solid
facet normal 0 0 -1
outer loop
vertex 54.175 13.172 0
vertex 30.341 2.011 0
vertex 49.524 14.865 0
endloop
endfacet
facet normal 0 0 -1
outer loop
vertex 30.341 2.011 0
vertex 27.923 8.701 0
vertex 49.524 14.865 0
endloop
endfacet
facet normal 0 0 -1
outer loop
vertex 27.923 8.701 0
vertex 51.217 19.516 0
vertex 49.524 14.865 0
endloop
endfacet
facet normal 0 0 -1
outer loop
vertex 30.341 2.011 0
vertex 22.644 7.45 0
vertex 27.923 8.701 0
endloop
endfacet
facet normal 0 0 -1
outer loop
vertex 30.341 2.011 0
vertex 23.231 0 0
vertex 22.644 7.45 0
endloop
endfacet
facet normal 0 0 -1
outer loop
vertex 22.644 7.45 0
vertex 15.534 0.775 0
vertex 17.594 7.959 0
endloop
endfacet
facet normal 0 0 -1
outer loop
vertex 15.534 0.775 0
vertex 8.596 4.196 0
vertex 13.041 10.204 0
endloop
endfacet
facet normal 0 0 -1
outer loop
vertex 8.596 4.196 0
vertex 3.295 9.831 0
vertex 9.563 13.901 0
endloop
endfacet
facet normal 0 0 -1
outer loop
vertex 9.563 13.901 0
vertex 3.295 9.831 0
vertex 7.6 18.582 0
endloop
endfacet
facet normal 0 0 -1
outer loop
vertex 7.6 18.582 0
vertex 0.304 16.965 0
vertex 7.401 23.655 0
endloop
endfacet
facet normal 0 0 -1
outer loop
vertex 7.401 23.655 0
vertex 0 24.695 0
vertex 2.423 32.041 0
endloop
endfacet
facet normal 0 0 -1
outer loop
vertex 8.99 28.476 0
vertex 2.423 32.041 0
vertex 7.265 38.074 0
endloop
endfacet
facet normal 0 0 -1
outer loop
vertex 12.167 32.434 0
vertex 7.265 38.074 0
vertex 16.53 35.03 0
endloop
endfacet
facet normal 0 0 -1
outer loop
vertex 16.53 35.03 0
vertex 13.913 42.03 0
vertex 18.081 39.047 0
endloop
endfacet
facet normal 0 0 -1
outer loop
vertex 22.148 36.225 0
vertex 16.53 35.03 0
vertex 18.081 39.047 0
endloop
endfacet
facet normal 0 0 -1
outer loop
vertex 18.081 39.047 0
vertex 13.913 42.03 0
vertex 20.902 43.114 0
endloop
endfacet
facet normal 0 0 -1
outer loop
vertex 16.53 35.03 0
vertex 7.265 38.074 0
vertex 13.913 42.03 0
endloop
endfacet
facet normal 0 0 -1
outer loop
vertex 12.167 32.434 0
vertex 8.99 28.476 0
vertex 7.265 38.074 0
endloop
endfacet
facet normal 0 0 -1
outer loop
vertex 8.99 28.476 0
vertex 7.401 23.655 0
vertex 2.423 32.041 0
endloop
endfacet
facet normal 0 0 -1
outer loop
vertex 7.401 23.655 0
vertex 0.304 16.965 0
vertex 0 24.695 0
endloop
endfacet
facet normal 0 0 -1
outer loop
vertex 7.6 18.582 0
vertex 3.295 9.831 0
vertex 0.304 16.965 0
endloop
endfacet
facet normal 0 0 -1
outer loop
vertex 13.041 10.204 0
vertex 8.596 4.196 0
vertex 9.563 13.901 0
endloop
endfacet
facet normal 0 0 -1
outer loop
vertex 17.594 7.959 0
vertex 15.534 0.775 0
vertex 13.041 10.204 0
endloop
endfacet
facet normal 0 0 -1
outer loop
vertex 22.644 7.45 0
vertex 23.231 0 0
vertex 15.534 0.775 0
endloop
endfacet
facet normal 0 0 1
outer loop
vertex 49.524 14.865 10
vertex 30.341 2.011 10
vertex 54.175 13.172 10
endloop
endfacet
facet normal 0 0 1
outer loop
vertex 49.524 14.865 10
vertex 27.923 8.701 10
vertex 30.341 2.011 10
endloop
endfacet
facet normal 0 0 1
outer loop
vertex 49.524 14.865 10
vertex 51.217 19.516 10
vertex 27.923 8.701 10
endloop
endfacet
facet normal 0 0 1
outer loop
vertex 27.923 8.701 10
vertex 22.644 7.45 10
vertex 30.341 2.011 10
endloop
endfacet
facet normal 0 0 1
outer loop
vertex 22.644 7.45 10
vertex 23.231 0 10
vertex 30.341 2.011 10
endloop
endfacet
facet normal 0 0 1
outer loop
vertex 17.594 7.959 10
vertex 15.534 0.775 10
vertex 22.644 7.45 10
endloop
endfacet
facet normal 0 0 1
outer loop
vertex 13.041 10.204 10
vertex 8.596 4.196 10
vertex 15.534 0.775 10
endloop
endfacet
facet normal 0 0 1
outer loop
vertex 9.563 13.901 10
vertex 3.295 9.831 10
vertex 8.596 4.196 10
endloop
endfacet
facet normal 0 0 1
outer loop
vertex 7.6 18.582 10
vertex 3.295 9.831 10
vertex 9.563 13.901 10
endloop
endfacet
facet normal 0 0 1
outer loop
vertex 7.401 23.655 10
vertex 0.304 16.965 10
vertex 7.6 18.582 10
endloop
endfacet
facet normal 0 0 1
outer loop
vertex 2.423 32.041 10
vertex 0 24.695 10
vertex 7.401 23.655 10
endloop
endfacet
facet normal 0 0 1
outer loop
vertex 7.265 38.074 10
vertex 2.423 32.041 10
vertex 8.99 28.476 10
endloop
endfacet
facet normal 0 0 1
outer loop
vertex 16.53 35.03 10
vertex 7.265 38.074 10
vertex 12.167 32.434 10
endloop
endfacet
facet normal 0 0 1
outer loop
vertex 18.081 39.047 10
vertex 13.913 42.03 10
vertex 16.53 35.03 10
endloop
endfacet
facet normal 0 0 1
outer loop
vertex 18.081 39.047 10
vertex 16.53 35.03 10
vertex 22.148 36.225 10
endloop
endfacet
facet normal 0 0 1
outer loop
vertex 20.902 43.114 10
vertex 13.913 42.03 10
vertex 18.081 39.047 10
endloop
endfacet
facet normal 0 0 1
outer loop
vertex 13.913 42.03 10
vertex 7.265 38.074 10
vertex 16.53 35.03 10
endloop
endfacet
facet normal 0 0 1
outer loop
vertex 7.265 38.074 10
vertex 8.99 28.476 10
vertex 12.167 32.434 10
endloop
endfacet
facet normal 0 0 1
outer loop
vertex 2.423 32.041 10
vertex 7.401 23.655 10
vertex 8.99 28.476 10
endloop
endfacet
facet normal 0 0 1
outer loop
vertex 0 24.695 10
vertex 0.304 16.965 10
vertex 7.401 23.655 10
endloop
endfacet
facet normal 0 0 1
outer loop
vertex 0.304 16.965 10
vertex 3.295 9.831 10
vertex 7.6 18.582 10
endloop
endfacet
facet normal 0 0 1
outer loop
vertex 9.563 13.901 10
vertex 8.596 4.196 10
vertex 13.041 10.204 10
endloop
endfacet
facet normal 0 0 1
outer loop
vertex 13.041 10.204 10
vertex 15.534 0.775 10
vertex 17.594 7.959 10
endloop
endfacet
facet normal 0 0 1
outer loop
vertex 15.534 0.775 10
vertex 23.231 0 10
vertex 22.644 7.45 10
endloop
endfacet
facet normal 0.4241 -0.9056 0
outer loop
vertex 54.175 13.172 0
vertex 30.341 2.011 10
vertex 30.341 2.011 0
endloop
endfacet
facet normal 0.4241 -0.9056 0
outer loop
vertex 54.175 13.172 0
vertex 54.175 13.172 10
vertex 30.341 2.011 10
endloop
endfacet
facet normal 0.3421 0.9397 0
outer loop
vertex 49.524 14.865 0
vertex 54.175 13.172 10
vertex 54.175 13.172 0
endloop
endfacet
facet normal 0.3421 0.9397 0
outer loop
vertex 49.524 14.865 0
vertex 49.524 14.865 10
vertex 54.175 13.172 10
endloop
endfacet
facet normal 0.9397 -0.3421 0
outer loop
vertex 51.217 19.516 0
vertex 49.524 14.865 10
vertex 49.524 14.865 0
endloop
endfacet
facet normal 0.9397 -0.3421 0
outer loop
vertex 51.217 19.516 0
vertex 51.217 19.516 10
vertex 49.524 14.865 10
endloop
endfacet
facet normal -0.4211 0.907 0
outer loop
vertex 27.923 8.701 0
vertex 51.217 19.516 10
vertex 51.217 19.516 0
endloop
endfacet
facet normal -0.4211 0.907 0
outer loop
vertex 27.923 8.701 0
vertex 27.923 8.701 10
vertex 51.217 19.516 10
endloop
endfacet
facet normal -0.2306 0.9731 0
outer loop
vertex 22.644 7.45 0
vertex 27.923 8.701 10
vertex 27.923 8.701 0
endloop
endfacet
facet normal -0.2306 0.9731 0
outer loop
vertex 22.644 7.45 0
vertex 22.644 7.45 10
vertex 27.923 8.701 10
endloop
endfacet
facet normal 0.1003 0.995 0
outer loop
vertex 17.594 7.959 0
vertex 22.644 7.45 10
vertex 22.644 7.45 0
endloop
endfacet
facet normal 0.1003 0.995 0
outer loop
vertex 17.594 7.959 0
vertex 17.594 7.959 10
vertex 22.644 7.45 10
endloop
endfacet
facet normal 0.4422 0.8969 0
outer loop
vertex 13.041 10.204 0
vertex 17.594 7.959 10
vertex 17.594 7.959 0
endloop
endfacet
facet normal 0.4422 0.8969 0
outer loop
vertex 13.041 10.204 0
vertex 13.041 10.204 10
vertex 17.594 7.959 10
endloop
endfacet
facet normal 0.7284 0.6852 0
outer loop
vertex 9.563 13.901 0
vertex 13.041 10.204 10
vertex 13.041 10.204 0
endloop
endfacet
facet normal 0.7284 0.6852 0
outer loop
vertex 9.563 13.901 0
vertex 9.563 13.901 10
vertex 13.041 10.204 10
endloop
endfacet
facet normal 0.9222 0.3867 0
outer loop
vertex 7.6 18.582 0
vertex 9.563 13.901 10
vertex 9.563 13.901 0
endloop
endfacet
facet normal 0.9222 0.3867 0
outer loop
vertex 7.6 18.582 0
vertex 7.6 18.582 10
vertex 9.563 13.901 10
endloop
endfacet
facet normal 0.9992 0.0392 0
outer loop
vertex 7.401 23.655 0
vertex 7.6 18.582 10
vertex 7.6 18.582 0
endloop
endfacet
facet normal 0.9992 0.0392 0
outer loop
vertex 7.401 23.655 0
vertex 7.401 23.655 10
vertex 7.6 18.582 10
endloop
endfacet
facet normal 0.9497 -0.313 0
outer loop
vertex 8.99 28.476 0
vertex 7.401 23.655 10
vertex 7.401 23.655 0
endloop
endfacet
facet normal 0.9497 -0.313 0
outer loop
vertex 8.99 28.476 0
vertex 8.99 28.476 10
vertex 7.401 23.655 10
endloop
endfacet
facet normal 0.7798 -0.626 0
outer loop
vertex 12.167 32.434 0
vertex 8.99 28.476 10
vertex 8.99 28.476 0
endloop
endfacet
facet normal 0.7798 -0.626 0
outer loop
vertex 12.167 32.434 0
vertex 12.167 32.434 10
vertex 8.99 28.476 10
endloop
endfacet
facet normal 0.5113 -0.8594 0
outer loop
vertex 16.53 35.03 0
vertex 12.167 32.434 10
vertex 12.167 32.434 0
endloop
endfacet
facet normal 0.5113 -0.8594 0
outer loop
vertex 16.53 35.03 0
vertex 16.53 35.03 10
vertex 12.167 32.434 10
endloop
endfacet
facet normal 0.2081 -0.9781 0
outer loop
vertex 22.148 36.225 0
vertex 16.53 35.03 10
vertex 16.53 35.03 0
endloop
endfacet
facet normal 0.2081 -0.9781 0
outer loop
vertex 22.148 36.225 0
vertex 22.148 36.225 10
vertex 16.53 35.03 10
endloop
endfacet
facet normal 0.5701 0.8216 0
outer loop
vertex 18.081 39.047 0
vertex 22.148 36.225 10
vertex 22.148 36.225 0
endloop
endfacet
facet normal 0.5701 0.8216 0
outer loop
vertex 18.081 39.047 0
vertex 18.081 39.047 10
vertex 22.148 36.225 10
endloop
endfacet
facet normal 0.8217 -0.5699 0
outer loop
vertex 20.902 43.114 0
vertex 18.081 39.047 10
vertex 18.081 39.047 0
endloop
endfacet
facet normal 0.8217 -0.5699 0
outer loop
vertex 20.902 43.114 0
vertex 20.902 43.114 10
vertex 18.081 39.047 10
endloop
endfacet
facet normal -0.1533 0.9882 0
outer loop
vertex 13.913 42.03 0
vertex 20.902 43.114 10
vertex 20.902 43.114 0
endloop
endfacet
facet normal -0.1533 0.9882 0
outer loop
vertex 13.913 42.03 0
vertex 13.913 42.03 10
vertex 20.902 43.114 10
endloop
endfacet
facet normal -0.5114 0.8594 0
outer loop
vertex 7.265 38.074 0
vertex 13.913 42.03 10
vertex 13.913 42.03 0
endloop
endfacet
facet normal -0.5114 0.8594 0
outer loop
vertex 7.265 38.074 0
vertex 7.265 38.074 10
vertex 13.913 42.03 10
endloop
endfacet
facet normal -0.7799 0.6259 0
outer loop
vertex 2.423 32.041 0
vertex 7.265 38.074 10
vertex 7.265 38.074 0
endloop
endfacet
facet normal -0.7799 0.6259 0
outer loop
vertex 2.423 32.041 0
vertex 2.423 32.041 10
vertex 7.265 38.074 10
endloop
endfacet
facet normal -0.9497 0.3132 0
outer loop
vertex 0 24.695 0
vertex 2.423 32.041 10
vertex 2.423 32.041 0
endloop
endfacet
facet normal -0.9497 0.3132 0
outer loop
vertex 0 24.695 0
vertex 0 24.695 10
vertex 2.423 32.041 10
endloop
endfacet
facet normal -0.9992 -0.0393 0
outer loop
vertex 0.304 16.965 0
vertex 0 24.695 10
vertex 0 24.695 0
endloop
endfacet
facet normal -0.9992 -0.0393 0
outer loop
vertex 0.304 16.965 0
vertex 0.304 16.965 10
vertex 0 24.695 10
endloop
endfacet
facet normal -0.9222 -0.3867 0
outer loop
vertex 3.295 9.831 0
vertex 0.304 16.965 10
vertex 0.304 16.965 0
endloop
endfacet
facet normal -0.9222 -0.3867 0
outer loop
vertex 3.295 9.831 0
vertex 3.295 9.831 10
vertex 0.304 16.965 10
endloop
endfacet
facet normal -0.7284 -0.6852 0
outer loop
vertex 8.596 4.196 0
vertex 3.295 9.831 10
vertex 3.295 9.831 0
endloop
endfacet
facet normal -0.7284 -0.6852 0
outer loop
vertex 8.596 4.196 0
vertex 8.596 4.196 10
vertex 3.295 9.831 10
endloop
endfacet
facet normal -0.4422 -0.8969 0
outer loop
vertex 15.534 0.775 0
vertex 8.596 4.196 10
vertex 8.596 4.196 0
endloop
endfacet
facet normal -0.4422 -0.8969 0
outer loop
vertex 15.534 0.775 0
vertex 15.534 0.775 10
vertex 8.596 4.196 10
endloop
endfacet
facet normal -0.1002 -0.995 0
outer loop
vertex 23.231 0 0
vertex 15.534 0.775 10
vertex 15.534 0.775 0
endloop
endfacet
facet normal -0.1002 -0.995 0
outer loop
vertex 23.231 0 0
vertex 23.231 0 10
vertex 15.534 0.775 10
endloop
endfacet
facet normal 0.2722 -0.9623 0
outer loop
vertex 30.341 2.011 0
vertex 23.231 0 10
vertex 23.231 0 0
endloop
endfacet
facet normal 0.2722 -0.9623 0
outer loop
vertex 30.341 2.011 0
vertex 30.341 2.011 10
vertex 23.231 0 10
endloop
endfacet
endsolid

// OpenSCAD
$fn = 32;

// ----------------------------------------------------------------------
// Hook plate: curl radius 18 mm over 205 degrees, 7 mm thick band
// ----------------------------------------------------------------------

// --- parameters (mm) ---
profile_height = 10;      // extrusion height
profile_points = 26;      // points of the closed outline

profile = [[18.081, 39.047], [20.902, 43.114], [13.913, 42.03], [7.265, 38.074], [2.423, 32.041], [0, 24.695], [0.304, 16.965], [3.295, 9.831], [8.596, 4.196], [15.534, 0.775], [23.231, 0], [30.341, 2.011], [54.175, 13.172], [49.524, 14.865], [51.217, 19.516], [27.923, 8.701], [22.644, 7.45], [17.594, 7.959], [13.041, 10.204], [9.563, 13.901], [7.6, 18.582], [7.401, 23.655], [8.99, 28.476], [12.167, 32.434], [16.53, 35.03], [22.148, 36.225]];  // single closed polygon, 26 points, counter clockwise

// --- the one profile operation ---
linear_extrude(height = profile_height) polygon(points = profile);
